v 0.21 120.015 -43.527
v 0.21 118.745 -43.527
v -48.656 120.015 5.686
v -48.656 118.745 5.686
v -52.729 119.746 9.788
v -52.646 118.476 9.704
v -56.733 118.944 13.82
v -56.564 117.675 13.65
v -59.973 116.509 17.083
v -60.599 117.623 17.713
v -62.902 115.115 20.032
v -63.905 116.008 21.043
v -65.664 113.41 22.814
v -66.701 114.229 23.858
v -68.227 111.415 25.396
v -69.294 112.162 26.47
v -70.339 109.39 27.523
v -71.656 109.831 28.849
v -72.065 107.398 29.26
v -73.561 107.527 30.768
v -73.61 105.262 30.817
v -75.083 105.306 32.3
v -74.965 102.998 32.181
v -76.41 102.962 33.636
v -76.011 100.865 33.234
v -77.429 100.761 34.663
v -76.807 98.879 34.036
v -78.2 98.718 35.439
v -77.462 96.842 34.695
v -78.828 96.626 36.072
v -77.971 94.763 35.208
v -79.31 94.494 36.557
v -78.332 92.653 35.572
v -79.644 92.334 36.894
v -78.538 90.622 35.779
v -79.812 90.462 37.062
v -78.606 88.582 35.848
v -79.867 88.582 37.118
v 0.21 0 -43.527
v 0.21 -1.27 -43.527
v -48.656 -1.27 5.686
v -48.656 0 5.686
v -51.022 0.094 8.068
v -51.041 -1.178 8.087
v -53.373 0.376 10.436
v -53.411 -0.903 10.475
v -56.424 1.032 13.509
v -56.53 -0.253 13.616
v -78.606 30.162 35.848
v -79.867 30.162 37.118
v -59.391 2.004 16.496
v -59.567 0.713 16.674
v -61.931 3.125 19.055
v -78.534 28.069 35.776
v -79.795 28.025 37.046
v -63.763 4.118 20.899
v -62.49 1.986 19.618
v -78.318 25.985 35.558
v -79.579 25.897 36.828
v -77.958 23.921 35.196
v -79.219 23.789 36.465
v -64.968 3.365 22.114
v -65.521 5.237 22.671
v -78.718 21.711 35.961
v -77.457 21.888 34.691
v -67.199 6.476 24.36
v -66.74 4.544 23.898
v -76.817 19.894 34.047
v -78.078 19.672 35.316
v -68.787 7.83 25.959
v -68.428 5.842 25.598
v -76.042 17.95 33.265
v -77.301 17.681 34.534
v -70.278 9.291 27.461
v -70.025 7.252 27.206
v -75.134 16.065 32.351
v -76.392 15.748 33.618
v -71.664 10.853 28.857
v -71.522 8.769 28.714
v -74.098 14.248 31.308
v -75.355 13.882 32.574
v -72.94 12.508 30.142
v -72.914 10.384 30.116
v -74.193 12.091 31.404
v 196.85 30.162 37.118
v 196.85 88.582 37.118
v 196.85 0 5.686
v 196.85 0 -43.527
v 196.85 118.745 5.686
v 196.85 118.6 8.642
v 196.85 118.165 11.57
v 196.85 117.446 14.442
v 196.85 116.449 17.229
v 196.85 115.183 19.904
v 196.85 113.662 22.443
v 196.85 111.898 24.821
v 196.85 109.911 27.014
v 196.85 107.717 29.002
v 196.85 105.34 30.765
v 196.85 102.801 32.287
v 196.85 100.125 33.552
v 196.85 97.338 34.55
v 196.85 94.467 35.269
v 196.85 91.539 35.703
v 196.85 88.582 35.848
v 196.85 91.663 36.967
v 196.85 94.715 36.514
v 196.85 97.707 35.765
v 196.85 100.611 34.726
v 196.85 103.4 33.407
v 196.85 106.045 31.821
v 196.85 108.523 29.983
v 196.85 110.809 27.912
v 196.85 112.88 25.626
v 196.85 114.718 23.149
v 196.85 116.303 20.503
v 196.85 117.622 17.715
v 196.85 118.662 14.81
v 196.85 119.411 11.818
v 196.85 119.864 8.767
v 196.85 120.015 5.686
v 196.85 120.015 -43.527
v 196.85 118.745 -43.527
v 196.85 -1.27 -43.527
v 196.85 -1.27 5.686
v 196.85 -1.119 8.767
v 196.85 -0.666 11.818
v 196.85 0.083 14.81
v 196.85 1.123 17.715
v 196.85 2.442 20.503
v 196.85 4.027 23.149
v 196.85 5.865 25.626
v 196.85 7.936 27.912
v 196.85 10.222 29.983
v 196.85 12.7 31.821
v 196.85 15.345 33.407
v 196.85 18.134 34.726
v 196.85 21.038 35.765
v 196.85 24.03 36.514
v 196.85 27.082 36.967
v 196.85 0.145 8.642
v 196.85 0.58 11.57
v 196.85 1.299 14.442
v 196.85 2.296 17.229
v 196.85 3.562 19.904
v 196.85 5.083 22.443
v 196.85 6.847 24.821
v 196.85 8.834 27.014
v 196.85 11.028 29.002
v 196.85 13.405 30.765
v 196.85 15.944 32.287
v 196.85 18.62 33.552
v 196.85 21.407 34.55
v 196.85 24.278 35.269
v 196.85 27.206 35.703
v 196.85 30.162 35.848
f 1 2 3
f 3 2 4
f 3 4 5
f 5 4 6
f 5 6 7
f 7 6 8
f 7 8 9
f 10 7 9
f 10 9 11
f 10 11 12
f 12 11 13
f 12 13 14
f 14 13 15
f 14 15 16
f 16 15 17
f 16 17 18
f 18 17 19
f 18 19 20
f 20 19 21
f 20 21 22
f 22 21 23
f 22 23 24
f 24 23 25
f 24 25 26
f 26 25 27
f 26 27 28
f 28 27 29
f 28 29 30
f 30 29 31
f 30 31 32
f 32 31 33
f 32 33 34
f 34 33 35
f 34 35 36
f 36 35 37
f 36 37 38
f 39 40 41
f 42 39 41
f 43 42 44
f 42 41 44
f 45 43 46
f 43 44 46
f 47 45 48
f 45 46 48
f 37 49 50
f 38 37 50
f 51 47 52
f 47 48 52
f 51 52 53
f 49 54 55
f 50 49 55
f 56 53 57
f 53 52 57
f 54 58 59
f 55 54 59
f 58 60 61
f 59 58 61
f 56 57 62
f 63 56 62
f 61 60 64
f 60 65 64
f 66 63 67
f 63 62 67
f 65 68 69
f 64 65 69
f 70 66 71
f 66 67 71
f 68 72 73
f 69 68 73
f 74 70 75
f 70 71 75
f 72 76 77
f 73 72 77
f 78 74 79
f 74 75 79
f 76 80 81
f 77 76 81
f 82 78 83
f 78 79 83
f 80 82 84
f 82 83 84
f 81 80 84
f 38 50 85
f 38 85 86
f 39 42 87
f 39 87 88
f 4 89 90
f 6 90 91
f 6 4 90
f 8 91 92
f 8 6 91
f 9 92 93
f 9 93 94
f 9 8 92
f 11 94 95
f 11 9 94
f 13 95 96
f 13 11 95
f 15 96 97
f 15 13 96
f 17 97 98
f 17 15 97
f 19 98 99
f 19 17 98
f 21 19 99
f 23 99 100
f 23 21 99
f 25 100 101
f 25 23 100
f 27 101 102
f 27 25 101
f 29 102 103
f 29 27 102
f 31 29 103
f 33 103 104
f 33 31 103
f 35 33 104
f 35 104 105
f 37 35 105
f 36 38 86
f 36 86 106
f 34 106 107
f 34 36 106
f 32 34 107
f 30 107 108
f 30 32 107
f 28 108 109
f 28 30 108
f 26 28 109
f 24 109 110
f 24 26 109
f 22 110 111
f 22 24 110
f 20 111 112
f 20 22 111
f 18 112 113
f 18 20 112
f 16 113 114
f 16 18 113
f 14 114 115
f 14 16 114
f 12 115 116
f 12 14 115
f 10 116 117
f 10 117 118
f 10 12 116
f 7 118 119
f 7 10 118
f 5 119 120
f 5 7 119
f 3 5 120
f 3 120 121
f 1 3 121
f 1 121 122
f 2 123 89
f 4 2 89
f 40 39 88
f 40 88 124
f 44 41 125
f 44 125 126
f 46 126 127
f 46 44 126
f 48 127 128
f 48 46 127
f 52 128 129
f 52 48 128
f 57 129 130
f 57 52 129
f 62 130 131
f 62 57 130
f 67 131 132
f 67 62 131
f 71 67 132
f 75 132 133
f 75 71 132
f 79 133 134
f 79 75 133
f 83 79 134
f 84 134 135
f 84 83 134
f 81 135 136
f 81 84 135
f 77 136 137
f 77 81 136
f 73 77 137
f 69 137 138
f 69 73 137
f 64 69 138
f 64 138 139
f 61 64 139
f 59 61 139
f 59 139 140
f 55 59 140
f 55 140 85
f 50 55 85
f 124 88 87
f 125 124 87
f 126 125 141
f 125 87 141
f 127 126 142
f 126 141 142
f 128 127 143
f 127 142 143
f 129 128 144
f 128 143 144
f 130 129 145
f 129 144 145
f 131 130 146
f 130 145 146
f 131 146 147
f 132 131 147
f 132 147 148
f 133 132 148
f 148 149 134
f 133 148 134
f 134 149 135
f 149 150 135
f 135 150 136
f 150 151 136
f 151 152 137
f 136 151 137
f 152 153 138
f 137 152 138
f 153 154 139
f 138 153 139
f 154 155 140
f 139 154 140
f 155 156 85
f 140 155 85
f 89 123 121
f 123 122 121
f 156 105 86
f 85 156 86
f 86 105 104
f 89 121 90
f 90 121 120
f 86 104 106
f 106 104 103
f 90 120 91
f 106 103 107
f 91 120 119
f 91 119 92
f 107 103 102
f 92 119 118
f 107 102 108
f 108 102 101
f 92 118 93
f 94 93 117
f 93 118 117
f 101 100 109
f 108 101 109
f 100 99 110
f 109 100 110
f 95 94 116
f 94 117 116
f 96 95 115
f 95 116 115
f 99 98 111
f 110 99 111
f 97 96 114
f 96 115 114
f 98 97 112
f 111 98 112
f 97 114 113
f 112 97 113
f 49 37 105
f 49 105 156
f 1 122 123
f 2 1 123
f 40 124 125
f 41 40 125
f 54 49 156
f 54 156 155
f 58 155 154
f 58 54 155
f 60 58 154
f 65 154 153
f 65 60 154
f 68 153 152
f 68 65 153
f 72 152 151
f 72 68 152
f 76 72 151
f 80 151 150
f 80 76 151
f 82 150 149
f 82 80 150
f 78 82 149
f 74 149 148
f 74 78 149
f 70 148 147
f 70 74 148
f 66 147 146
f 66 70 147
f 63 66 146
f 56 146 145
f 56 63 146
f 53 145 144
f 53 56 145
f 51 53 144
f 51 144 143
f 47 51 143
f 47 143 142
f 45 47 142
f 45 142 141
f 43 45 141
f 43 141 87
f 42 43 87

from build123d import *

# Parameters (mm, degrees)
BOSS_EXTRUDE1_DEPTH      = 196.85
BOSS_EXTRUDE1_DEPTH_BACK = 80.01
CUT_EXTRUDE1_DEPTH       = 196.85
CUT_EXTRUDE1_DEPTH_BACK  = 196.85


with BuildPart() as part:
    # Sketch1 → Boss-Extrude1 (new, two sides: drawn at the far end of the back side and taken through both)
    with BuildSketch(Plane(origin=(0, 0, -24.476668928), x_dir=(0, 0, -1), z_dir=(1, 0, 0)).offset(-BOSS_EXTRUDE1_DEPTH_BACK)):
        with BuildLine():
            Line((19.05, 118.745), (-30.1625, 118.745))
            ThreePointArc((-30.1625, 118.745), (-51.490608288, 109.910608288), (-60.325, 88.5825))
            Line((-60.325, 88.5825), (-60.325, 30.1625))
            ThreePointArc((-60.325, 30.1625), (-51.490608288, 8.834391712), (-30.1625, 0))
            Line((-30.1625, 0), (19.05, 0))
            Line((19.05, 0), (19.05, -1.27))
            Line((19.05, -1.27), (-30.1625, -1.27))
            ThreePointArc((-30.1625, -1.27), (-52.3886339, 7.9363661), (-61.595, 30.1625))
            Line((-61.595, 30.1625), (-61.595, 88.5825))
            ThreePointArc((-61.595, 88.5825), (-52.3886339, 110.8086339), (-30.1625, 120.015))
            Line((-30.1625, 120.015), (19.05, 120.015))
            Line((19.05, 120.015), (19.05, 118.745))
        make_face()
    extrude(amount=BOSS_EXTRUDE1_DEPTH + BOSS_EXTRUDE1_DEPTH_BACK)

    # Sketch2 → Cut-Extrude1 (cut, two sides: drawn at the far end of the back side and taken through both)
    with BuildSketch(Plane(origin=(0, 0, 0), x_dir=(1, 0, 0), z_dir=(0, 1, 0)).offset(-CUT_EXTRUDE1_DEPTH_BACK)):
        Polygon((0.210197293, 43.526668928), (-120.988442542, -78.530752949), (-120.988442542, 43.526668928), align=None)
    extrude(amount=CUT_EXTRUDE1_DEPTH + CUT_EXTRUDE1_DEPTH_BACK, mode=Mode.SUBTRACT)


solid = part.part
